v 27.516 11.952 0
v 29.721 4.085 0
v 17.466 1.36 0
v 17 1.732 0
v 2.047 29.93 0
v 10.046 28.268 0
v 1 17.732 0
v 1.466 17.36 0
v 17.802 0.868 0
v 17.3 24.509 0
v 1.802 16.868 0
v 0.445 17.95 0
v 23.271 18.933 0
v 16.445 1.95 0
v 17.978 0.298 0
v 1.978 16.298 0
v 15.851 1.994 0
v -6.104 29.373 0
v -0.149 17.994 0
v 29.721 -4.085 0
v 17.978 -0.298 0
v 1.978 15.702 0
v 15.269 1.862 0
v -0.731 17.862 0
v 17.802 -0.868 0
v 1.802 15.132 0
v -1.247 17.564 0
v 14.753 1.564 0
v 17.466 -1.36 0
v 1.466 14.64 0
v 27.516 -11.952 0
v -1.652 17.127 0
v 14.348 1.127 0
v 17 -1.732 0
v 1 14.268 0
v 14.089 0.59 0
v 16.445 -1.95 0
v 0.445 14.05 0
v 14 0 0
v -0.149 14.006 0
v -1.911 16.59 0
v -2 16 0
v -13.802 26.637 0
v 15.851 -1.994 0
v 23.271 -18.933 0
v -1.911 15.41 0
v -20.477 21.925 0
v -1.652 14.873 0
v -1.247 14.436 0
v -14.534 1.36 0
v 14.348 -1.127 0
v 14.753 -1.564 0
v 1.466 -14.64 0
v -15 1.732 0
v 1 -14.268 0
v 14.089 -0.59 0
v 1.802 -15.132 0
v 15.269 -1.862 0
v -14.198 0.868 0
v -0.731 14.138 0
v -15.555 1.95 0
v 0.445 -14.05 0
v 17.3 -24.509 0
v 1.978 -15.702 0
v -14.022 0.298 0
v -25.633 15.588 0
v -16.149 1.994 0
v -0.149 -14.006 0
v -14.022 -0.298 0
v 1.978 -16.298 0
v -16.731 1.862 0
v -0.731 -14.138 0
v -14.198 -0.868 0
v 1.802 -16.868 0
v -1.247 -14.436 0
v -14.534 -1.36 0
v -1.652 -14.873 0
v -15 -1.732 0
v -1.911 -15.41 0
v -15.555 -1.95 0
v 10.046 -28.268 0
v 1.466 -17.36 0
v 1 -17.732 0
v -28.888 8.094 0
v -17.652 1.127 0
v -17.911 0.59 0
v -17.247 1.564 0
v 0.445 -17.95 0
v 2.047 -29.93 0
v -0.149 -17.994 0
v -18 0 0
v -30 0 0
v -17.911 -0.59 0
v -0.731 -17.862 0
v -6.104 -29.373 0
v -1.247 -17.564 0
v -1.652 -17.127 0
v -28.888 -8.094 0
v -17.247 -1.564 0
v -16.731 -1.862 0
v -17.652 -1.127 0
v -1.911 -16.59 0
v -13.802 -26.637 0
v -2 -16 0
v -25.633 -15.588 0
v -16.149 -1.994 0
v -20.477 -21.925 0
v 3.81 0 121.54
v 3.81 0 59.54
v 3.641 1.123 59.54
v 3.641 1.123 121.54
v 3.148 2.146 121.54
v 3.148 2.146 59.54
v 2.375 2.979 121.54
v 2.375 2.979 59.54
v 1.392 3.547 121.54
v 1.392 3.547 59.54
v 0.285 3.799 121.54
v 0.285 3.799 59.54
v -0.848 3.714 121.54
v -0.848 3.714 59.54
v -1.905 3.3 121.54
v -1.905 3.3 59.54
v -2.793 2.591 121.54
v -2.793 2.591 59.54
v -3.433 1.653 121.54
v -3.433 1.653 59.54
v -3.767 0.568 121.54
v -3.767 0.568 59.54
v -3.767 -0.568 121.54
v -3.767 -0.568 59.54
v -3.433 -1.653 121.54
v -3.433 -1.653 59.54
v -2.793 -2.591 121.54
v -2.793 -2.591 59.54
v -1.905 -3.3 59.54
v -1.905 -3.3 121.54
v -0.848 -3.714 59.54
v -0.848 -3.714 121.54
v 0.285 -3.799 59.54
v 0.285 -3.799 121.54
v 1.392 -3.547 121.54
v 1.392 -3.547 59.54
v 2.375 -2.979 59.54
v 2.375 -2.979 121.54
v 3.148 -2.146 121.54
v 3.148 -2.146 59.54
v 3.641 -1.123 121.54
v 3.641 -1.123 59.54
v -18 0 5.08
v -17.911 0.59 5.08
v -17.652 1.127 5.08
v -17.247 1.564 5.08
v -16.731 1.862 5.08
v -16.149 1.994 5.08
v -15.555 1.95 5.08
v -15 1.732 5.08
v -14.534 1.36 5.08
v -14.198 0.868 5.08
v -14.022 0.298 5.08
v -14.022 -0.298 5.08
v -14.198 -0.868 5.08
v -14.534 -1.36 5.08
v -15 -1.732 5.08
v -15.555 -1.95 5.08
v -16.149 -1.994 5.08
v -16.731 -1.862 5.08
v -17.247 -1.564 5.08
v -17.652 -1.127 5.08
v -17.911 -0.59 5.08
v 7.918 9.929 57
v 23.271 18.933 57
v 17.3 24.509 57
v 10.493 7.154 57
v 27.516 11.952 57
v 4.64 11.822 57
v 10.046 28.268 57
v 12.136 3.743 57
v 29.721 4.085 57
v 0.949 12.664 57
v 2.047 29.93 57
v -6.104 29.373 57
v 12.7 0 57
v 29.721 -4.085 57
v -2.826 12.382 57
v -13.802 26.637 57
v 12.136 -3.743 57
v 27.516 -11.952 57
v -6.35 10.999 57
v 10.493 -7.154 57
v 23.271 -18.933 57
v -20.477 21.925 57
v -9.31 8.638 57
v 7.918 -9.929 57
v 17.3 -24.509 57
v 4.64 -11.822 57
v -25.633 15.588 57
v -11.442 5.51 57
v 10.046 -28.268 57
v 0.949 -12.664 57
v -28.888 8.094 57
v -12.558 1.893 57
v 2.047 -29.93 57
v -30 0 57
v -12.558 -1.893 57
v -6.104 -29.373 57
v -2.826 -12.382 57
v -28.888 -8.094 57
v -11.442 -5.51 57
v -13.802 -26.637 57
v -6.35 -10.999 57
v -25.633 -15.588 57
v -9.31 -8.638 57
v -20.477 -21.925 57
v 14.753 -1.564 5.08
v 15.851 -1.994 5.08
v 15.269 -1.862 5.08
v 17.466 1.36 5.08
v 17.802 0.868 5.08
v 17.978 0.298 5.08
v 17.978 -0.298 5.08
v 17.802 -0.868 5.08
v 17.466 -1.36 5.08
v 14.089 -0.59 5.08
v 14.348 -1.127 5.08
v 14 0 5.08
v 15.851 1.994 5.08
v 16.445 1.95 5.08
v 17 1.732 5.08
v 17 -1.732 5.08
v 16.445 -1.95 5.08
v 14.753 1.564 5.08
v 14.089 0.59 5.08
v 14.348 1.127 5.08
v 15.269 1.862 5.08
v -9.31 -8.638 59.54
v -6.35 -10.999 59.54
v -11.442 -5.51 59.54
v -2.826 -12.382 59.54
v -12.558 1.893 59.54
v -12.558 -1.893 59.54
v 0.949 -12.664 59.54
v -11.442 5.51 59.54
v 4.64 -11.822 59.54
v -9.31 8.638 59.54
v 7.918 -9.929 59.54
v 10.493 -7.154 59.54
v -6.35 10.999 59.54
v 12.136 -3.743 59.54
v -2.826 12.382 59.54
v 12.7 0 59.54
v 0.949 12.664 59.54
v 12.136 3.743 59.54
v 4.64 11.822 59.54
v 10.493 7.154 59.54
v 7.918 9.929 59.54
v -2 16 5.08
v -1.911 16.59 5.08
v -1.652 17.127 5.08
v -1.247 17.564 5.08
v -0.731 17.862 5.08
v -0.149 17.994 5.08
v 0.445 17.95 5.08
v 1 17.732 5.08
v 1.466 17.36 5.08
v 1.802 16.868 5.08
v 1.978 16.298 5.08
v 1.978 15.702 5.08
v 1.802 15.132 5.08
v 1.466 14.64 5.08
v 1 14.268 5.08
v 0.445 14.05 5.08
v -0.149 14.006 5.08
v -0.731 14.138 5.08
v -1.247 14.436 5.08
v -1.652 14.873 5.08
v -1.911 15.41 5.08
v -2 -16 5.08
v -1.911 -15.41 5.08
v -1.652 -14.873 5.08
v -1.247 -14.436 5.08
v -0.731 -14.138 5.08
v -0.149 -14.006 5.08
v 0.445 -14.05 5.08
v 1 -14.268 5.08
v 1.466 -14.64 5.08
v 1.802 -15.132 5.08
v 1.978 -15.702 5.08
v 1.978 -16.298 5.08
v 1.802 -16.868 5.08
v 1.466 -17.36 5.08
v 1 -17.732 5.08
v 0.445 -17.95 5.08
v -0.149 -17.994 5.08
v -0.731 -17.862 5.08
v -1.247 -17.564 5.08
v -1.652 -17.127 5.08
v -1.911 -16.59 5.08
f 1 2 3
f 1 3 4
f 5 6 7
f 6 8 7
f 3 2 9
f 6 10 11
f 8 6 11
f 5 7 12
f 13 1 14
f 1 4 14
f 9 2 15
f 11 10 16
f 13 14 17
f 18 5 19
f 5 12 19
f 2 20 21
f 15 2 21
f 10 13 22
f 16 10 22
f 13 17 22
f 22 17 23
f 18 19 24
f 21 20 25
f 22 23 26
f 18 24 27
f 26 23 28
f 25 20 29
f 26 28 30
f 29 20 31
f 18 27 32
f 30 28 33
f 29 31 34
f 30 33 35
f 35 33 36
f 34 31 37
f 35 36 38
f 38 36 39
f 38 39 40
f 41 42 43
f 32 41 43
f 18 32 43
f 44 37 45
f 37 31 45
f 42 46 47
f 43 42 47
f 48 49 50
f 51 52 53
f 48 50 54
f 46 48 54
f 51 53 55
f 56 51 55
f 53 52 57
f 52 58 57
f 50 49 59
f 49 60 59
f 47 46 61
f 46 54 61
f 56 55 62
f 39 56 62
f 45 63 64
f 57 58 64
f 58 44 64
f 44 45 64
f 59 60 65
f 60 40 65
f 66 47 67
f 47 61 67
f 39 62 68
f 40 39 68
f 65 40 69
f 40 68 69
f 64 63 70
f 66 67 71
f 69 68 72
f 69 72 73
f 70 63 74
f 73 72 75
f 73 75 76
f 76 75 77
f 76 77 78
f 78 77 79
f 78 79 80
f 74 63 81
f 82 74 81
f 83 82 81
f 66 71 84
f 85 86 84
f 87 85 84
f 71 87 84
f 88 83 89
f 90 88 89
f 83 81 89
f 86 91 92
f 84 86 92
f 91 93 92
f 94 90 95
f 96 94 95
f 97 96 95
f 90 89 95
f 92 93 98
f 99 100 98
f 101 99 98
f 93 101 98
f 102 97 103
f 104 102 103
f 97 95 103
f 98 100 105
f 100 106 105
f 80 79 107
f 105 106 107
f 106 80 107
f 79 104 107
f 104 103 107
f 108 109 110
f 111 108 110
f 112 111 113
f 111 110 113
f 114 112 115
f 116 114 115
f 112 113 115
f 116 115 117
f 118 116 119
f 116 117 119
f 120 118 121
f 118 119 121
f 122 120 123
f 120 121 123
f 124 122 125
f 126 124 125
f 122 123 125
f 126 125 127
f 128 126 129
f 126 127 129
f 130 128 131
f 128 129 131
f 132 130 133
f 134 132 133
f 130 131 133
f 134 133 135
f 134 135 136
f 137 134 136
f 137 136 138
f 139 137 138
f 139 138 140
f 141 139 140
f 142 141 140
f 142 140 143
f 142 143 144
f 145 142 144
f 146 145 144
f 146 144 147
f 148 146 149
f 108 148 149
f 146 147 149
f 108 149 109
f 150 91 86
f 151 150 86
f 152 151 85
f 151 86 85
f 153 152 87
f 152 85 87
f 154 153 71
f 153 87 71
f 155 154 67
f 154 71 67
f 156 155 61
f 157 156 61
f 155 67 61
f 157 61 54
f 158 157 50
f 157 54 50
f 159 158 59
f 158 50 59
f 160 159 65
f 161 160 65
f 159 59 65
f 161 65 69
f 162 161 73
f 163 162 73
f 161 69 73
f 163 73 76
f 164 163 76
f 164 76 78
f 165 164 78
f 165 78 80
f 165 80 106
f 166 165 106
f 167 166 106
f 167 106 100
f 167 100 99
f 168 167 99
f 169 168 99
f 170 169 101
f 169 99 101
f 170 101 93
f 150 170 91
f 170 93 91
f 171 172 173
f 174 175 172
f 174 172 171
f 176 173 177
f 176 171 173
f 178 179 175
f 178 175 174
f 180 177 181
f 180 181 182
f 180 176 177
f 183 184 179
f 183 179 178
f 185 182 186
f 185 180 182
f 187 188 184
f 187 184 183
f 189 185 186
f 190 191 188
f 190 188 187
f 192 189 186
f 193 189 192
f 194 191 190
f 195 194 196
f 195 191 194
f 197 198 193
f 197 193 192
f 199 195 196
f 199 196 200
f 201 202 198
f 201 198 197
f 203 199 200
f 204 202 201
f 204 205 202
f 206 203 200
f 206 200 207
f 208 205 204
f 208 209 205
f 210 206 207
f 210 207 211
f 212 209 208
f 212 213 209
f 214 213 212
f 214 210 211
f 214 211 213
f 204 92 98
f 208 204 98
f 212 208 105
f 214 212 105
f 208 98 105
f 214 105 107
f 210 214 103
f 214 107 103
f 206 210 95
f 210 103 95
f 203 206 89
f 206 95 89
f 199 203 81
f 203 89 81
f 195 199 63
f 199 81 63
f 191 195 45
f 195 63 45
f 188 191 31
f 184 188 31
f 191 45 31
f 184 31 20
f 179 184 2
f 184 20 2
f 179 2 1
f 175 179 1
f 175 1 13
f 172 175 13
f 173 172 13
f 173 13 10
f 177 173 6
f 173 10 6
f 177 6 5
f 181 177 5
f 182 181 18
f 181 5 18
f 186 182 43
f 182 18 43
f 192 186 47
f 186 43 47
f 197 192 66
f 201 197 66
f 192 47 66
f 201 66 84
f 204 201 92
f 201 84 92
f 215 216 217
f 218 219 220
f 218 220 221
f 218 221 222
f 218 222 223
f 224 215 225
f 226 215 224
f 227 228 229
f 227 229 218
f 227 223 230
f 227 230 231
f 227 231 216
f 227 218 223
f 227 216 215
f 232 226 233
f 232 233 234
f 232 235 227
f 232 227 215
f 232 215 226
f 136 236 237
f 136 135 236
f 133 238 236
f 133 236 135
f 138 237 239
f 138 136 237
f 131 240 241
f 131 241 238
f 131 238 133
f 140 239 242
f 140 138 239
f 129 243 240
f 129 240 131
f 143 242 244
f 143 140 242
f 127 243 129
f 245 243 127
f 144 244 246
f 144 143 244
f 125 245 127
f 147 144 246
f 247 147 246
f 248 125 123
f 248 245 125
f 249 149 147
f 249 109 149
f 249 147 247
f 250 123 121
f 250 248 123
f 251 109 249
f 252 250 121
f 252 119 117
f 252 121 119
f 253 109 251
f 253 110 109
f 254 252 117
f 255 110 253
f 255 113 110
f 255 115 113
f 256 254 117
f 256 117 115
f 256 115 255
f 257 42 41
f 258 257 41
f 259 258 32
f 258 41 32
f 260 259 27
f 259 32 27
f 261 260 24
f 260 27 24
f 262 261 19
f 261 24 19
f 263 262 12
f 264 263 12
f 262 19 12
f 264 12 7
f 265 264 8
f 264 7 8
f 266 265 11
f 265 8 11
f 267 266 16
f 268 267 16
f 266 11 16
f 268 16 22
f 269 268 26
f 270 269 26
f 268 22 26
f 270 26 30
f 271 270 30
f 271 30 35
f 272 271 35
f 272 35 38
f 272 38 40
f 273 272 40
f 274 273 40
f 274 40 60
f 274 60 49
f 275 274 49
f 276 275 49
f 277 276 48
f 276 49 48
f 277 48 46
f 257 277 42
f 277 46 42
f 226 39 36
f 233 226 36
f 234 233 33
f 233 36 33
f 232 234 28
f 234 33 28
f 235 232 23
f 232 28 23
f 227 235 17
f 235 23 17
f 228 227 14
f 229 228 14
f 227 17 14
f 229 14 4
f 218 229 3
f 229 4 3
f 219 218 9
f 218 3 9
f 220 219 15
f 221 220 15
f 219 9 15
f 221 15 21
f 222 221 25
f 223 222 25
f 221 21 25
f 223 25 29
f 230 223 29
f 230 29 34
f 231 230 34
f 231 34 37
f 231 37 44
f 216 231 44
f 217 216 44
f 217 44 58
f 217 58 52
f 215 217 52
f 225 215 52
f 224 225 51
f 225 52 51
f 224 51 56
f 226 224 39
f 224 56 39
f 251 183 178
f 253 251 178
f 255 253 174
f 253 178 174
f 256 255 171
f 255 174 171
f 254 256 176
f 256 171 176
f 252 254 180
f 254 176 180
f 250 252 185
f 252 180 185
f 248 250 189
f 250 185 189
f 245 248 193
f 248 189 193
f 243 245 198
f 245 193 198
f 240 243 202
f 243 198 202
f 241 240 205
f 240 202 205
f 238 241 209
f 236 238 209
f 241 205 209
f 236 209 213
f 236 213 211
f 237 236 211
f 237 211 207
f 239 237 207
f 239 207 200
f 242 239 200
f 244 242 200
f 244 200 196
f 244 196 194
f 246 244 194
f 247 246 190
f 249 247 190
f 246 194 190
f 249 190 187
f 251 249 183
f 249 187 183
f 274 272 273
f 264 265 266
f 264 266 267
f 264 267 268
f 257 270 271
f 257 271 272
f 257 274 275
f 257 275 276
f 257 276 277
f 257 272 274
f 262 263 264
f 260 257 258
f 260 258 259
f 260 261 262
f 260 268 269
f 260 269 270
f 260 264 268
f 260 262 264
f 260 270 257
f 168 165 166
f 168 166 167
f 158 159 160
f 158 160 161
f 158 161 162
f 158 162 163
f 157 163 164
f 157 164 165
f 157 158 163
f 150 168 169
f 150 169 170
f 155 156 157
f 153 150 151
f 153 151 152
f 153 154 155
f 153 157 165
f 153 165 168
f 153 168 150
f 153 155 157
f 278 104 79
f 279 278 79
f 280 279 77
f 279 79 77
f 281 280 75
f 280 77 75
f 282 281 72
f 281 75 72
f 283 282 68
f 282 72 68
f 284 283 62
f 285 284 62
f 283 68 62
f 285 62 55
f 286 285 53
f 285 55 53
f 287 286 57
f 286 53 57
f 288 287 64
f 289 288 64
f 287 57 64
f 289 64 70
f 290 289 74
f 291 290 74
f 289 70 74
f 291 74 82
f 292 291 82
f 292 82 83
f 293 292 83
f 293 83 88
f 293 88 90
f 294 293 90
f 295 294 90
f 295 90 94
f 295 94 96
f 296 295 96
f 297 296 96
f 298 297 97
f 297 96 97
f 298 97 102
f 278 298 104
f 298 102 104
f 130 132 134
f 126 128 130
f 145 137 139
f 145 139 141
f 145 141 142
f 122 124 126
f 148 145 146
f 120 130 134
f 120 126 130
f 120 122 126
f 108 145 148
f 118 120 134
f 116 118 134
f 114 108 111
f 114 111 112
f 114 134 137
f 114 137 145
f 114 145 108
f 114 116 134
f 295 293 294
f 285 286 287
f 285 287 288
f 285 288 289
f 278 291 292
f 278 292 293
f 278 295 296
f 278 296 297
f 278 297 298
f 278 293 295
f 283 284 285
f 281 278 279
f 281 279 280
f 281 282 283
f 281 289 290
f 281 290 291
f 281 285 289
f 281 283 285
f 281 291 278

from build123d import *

# Parameters (mm, degrees)
SKETCH1_R           = 30
BOSS_EXTRUDE1_DEPTH = 57
SKETCH2_R           = 12.7
BOSS_EXTRUDE2_DEPTH = 2.54
SKETCH3_R           = 3.81
BOSS_EXTRUDE3_DEPTH = 62
SKETCH4_R           = 2
CUT_EXTRUDE1_DEPTH  = 5.08


with BuildPart() as part:
    # Sketch1 → Boss-Extrude1 (new body)
    with BuildSketch(Plane.XY):
        with Locations(Location((0, 0, 0), (0, 0, 180))):
            Circle(SKETCH1_R)
    extrude(amount=BOSS_EXTRUDE1_DEPTH)

    # Sketch2 → Boss-Extrude2 (add)
    with BuildSketch(Plane.XY.offset(57)):
        Circle(SKETCH2_R)
    extrude(amount=BOSS_EXTRUDE2_DEPTH)

    # Sketch3 → Boss-Extrude3 (add)
    with BuildSketch(Plane.XY.offset(59.54)):
        Circle(SKETCH3_R)
    extrude(amount=BOSS_EXTRUDE3_DEPTH)

    # Sketch4 → Cut-Extrude1 (cut)
    with BuildSketch(Plane(origin=(0, 0, 0), x_dir=(-1, 0, 0), z_dir=(0, 0, -1))):
        with Locations((0, -16)):
            Circle(SKETCH4_R)
        with Locations((-16, 0)):
            Circle(SKETCH4_R)
        with Locations((0, 16)):
            Circle(SKETCH4_R)
        with Locations((16, 0)):
            Circle(SKETCH4_R)
    extrude(amount=-CUT_EXTRUDE1_DEPTH, mode=Mode.SUBTRACT)


solid = part.part
